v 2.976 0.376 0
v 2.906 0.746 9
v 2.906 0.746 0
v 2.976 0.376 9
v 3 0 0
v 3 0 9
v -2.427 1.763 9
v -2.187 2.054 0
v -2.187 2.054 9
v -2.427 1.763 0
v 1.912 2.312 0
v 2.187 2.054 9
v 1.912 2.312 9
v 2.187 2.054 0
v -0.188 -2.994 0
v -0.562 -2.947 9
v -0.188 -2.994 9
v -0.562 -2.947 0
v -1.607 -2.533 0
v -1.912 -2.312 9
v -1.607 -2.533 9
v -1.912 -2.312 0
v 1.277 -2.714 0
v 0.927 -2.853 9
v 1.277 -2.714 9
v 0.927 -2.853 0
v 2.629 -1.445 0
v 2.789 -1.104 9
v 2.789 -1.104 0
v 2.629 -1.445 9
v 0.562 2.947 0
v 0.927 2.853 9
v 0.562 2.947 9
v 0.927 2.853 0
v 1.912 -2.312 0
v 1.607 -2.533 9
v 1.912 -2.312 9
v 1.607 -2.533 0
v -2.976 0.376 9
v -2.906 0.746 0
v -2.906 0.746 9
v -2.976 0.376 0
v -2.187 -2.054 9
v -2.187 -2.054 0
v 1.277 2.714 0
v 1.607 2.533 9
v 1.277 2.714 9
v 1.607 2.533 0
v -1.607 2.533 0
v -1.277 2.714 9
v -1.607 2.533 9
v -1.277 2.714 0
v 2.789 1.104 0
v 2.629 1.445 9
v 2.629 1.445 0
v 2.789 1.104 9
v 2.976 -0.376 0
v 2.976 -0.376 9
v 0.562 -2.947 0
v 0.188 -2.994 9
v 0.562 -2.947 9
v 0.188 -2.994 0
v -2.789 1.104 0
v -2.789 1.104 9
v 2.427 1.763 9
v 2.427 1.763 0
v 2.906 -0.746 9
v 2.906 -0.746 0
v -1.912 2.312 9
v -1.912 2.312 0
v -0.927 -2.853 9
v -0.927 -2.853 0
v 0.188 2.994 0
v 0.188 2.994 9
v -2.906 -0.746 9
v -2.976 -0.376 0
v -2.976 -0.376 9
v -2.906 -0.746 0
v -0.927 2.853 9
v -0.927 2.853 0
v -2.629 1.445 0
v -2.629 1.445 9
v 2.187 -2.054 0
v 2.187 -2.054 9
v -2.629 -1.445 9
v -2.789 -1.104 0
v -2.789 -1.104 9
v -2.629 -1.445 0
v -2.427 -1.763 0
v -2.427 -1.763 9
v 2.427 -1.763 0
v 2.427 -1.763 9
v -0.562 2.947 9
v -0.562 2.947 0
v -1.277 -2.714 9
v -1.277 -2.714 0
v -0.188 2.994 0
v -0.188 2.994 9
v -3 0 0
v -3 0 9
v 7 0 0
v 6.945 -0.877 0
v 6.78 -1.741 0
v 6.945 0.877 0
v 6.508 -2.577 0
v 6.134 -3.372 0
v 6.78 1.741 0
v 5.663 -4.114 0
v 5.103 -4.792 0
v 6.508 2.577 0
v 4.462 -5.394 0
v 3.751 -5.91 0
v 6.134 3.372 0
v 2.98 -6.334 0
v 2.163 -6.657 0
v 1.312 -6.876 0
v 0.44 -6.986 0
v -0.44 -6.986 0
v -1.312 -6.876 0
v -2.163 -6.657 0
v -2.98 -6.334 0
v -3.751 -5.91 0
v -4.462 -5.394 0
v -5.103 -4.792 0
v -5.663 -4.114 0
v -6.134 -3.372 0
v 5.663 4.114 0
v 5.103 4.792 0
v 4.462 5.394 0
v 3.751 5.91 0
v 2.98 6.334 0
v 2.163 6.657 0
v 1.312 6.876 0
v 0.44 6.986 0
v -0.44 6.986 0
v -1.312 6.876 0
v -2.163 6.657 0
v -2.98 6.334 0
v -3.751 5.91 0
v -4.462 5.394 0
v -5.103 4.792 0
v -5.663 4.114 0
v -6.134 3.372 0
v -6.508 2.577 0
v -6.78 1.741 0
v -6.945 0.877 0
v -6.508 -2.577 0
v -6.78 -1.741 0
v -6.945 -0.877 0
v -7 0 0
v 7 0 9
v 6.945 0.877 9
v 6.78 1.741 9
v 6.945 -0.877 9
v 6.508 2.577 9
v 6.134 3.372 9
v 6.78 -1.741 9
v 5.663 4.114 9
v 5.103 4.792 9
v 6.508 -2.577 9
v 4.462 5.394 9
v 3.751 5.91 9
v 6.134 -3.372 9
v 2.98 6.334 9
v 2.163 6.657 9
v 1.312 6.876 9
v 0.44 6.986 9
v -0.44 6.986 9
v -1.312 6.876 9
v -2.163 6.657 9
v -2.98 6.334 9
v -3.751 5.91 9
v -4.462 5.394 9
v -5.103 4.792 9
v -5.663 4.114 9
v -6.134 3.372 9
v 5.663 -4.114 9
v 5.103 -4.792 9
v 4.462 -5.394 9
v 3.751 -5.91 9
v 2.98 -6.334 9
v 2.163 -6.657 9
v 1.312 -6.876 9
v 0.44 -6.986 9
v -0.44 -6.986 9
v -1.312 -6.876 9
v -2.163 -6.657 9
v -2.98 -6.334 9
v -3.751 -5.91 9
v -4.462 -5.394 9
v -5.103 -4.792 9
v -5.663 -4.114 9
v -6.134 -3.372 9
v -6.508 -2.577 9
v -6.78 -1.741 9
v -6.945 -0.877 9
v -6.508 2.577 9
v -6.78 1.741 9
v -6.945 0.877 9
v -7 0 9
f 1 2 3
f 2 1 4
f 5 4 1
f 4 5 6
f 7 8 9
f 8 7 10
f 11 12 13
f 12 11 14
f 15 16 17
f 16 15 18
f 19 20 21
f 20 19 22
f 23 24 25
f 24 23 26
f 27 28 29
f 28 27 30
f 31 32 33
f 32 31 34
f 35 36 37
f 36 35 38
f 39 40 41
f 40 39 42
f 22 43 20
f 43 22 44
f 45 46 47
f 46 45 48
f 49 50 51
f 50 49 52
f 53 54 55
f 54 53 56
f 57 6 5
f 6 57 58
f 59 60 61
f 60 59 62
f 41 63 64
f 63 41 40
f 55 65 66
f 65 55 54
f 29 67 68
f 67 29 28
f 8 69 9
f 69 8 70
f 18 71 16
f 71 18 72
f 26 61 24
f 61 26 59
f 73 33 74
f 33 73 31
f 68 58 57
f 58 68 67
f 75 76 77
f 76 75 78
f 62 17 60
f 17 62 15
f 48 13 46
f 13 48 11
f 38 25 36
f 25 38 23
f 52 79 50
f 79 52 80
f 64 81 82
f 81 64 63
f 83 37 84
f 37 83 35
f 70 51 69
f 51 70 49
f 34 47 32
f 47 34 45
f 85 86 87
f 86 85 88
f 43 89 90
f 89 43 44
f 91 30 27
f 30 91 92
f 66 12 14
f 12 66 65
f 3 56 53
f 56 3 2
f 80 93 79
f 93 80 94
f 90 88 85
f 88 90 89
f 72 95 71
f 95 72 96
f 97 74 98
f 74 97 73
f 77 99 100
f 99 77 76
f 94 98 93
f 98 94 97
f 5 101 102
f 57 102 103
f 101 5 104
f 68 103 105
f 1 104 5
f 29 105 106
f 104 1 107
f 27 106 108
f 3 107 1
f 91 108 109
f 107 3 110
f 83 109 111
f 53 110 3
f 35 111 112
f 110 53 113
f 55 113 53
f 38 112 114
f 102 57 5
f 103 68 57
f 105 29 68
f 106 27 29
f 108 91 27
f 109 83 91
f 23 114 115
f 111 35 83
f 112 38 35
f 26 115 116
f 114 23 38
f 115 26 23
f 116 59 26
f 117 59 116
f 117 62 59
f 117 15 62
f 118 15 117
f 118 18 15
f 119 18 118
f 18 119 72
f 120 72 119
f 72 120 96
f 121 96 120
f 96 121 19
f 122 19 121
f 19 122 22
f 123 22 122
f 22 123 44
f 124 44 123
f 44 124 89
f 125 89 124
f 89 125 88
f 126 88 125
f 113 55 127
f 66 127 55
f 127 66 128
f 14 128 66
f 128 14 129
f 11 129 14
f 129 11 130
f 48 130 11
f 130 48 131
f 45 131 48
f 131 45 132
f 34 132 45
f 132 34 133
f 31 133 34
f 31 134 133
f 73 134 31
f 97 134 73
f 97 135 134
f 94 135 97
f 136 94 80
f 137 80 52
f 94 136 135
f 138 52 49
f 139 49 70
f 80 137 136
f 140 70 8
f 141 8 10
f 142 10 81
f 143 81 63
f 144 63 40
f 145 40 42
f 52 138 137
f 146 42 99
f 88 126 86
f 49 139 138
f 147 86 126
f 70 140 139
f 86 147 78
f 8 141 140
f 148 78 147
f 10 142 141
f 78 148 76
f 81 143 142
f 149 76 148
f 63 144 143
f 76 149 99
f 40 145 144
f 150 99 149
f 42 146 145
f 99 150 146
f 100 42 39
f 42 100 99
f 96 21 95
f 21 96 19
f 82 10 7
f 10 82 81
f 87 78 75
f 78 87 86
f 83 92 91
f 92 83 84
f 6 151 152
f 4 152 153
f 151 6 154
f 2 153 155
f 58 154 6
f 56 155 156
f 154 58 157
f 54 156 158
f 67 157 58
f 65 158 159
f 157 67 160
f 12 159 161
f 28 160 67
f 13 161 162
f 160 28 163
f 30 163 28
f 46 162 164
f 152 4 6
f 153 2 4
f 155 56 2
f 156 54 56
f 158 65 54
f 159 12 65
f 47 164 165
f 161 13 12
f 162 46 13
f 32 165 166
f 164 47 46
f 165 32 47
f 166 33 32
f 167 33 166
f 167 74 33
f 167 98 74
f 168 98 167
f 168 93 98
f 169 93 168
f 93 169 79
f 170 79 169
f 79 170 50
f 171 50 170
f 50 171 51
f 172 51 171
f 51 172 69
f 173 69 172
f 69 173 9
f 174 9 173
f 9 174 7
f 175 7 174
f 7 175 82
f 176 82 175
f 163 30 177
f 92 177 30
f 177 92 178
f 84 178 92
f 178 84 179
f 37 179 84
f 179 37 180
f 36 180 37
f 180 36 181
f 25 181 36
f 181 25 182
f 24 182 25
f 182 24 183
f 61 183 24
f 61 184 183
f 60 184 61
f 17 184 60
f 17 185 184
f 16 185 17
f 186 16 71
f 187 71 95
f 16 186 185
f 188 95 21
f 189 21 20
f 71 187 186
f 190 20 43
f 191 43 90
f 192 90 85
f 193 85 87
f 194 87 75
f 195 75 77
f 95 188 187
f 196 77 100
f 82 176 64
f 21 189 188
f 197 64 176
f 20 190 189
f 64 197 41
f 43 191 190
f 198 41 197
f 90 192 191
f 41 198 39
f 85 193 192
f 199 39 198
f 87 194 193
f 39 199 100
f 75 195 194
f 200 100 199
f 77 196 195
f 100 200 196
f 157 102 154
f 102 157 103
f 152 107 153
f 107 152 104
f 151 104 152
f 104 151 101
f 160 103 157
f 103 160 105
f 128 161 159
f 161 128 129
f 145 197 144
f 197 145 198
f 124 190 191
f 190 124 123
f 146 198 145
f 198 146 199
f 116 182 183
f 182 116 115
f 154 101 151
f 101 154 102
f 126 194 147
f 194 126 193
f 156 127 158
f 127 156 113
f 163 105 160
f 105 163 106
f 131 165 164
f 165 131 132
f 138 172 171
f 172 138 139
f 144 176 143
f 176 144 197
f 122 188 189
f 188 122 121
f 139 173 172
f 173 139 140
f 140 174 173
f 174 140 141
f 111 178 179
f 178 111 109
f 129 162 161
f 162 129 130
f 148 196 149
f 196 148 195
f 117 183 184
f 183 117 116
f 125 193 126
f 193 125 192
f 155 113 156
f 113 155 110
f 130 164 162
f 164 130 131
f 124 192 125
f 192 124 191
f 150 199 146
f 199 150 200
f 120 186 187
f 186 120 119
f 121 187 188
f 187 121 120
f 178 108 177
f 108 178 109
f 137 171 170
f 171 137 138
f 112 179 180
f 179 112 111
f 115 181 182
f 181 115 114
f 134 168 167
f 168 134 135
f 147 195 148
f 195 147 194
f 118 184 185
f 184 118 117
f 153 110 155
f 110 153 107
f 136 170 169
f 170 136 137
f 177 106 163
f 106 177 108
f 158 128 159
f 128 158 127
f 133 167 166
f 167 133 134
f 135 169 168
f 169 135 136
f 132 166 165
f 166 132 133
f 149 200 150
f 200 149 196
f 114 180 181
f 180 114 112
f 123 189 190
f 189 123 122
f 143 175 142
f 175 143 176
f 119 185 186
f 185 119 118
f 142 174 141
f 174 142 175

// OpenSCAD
$fn = 50;

difference() {
	union() {
		cylinder(h = 9, r = 7.0);
	}
	union() {
		cylinder(h = 9, r = 3.0);
		cylinder(h = 9, r = 1.5);
	}
}
